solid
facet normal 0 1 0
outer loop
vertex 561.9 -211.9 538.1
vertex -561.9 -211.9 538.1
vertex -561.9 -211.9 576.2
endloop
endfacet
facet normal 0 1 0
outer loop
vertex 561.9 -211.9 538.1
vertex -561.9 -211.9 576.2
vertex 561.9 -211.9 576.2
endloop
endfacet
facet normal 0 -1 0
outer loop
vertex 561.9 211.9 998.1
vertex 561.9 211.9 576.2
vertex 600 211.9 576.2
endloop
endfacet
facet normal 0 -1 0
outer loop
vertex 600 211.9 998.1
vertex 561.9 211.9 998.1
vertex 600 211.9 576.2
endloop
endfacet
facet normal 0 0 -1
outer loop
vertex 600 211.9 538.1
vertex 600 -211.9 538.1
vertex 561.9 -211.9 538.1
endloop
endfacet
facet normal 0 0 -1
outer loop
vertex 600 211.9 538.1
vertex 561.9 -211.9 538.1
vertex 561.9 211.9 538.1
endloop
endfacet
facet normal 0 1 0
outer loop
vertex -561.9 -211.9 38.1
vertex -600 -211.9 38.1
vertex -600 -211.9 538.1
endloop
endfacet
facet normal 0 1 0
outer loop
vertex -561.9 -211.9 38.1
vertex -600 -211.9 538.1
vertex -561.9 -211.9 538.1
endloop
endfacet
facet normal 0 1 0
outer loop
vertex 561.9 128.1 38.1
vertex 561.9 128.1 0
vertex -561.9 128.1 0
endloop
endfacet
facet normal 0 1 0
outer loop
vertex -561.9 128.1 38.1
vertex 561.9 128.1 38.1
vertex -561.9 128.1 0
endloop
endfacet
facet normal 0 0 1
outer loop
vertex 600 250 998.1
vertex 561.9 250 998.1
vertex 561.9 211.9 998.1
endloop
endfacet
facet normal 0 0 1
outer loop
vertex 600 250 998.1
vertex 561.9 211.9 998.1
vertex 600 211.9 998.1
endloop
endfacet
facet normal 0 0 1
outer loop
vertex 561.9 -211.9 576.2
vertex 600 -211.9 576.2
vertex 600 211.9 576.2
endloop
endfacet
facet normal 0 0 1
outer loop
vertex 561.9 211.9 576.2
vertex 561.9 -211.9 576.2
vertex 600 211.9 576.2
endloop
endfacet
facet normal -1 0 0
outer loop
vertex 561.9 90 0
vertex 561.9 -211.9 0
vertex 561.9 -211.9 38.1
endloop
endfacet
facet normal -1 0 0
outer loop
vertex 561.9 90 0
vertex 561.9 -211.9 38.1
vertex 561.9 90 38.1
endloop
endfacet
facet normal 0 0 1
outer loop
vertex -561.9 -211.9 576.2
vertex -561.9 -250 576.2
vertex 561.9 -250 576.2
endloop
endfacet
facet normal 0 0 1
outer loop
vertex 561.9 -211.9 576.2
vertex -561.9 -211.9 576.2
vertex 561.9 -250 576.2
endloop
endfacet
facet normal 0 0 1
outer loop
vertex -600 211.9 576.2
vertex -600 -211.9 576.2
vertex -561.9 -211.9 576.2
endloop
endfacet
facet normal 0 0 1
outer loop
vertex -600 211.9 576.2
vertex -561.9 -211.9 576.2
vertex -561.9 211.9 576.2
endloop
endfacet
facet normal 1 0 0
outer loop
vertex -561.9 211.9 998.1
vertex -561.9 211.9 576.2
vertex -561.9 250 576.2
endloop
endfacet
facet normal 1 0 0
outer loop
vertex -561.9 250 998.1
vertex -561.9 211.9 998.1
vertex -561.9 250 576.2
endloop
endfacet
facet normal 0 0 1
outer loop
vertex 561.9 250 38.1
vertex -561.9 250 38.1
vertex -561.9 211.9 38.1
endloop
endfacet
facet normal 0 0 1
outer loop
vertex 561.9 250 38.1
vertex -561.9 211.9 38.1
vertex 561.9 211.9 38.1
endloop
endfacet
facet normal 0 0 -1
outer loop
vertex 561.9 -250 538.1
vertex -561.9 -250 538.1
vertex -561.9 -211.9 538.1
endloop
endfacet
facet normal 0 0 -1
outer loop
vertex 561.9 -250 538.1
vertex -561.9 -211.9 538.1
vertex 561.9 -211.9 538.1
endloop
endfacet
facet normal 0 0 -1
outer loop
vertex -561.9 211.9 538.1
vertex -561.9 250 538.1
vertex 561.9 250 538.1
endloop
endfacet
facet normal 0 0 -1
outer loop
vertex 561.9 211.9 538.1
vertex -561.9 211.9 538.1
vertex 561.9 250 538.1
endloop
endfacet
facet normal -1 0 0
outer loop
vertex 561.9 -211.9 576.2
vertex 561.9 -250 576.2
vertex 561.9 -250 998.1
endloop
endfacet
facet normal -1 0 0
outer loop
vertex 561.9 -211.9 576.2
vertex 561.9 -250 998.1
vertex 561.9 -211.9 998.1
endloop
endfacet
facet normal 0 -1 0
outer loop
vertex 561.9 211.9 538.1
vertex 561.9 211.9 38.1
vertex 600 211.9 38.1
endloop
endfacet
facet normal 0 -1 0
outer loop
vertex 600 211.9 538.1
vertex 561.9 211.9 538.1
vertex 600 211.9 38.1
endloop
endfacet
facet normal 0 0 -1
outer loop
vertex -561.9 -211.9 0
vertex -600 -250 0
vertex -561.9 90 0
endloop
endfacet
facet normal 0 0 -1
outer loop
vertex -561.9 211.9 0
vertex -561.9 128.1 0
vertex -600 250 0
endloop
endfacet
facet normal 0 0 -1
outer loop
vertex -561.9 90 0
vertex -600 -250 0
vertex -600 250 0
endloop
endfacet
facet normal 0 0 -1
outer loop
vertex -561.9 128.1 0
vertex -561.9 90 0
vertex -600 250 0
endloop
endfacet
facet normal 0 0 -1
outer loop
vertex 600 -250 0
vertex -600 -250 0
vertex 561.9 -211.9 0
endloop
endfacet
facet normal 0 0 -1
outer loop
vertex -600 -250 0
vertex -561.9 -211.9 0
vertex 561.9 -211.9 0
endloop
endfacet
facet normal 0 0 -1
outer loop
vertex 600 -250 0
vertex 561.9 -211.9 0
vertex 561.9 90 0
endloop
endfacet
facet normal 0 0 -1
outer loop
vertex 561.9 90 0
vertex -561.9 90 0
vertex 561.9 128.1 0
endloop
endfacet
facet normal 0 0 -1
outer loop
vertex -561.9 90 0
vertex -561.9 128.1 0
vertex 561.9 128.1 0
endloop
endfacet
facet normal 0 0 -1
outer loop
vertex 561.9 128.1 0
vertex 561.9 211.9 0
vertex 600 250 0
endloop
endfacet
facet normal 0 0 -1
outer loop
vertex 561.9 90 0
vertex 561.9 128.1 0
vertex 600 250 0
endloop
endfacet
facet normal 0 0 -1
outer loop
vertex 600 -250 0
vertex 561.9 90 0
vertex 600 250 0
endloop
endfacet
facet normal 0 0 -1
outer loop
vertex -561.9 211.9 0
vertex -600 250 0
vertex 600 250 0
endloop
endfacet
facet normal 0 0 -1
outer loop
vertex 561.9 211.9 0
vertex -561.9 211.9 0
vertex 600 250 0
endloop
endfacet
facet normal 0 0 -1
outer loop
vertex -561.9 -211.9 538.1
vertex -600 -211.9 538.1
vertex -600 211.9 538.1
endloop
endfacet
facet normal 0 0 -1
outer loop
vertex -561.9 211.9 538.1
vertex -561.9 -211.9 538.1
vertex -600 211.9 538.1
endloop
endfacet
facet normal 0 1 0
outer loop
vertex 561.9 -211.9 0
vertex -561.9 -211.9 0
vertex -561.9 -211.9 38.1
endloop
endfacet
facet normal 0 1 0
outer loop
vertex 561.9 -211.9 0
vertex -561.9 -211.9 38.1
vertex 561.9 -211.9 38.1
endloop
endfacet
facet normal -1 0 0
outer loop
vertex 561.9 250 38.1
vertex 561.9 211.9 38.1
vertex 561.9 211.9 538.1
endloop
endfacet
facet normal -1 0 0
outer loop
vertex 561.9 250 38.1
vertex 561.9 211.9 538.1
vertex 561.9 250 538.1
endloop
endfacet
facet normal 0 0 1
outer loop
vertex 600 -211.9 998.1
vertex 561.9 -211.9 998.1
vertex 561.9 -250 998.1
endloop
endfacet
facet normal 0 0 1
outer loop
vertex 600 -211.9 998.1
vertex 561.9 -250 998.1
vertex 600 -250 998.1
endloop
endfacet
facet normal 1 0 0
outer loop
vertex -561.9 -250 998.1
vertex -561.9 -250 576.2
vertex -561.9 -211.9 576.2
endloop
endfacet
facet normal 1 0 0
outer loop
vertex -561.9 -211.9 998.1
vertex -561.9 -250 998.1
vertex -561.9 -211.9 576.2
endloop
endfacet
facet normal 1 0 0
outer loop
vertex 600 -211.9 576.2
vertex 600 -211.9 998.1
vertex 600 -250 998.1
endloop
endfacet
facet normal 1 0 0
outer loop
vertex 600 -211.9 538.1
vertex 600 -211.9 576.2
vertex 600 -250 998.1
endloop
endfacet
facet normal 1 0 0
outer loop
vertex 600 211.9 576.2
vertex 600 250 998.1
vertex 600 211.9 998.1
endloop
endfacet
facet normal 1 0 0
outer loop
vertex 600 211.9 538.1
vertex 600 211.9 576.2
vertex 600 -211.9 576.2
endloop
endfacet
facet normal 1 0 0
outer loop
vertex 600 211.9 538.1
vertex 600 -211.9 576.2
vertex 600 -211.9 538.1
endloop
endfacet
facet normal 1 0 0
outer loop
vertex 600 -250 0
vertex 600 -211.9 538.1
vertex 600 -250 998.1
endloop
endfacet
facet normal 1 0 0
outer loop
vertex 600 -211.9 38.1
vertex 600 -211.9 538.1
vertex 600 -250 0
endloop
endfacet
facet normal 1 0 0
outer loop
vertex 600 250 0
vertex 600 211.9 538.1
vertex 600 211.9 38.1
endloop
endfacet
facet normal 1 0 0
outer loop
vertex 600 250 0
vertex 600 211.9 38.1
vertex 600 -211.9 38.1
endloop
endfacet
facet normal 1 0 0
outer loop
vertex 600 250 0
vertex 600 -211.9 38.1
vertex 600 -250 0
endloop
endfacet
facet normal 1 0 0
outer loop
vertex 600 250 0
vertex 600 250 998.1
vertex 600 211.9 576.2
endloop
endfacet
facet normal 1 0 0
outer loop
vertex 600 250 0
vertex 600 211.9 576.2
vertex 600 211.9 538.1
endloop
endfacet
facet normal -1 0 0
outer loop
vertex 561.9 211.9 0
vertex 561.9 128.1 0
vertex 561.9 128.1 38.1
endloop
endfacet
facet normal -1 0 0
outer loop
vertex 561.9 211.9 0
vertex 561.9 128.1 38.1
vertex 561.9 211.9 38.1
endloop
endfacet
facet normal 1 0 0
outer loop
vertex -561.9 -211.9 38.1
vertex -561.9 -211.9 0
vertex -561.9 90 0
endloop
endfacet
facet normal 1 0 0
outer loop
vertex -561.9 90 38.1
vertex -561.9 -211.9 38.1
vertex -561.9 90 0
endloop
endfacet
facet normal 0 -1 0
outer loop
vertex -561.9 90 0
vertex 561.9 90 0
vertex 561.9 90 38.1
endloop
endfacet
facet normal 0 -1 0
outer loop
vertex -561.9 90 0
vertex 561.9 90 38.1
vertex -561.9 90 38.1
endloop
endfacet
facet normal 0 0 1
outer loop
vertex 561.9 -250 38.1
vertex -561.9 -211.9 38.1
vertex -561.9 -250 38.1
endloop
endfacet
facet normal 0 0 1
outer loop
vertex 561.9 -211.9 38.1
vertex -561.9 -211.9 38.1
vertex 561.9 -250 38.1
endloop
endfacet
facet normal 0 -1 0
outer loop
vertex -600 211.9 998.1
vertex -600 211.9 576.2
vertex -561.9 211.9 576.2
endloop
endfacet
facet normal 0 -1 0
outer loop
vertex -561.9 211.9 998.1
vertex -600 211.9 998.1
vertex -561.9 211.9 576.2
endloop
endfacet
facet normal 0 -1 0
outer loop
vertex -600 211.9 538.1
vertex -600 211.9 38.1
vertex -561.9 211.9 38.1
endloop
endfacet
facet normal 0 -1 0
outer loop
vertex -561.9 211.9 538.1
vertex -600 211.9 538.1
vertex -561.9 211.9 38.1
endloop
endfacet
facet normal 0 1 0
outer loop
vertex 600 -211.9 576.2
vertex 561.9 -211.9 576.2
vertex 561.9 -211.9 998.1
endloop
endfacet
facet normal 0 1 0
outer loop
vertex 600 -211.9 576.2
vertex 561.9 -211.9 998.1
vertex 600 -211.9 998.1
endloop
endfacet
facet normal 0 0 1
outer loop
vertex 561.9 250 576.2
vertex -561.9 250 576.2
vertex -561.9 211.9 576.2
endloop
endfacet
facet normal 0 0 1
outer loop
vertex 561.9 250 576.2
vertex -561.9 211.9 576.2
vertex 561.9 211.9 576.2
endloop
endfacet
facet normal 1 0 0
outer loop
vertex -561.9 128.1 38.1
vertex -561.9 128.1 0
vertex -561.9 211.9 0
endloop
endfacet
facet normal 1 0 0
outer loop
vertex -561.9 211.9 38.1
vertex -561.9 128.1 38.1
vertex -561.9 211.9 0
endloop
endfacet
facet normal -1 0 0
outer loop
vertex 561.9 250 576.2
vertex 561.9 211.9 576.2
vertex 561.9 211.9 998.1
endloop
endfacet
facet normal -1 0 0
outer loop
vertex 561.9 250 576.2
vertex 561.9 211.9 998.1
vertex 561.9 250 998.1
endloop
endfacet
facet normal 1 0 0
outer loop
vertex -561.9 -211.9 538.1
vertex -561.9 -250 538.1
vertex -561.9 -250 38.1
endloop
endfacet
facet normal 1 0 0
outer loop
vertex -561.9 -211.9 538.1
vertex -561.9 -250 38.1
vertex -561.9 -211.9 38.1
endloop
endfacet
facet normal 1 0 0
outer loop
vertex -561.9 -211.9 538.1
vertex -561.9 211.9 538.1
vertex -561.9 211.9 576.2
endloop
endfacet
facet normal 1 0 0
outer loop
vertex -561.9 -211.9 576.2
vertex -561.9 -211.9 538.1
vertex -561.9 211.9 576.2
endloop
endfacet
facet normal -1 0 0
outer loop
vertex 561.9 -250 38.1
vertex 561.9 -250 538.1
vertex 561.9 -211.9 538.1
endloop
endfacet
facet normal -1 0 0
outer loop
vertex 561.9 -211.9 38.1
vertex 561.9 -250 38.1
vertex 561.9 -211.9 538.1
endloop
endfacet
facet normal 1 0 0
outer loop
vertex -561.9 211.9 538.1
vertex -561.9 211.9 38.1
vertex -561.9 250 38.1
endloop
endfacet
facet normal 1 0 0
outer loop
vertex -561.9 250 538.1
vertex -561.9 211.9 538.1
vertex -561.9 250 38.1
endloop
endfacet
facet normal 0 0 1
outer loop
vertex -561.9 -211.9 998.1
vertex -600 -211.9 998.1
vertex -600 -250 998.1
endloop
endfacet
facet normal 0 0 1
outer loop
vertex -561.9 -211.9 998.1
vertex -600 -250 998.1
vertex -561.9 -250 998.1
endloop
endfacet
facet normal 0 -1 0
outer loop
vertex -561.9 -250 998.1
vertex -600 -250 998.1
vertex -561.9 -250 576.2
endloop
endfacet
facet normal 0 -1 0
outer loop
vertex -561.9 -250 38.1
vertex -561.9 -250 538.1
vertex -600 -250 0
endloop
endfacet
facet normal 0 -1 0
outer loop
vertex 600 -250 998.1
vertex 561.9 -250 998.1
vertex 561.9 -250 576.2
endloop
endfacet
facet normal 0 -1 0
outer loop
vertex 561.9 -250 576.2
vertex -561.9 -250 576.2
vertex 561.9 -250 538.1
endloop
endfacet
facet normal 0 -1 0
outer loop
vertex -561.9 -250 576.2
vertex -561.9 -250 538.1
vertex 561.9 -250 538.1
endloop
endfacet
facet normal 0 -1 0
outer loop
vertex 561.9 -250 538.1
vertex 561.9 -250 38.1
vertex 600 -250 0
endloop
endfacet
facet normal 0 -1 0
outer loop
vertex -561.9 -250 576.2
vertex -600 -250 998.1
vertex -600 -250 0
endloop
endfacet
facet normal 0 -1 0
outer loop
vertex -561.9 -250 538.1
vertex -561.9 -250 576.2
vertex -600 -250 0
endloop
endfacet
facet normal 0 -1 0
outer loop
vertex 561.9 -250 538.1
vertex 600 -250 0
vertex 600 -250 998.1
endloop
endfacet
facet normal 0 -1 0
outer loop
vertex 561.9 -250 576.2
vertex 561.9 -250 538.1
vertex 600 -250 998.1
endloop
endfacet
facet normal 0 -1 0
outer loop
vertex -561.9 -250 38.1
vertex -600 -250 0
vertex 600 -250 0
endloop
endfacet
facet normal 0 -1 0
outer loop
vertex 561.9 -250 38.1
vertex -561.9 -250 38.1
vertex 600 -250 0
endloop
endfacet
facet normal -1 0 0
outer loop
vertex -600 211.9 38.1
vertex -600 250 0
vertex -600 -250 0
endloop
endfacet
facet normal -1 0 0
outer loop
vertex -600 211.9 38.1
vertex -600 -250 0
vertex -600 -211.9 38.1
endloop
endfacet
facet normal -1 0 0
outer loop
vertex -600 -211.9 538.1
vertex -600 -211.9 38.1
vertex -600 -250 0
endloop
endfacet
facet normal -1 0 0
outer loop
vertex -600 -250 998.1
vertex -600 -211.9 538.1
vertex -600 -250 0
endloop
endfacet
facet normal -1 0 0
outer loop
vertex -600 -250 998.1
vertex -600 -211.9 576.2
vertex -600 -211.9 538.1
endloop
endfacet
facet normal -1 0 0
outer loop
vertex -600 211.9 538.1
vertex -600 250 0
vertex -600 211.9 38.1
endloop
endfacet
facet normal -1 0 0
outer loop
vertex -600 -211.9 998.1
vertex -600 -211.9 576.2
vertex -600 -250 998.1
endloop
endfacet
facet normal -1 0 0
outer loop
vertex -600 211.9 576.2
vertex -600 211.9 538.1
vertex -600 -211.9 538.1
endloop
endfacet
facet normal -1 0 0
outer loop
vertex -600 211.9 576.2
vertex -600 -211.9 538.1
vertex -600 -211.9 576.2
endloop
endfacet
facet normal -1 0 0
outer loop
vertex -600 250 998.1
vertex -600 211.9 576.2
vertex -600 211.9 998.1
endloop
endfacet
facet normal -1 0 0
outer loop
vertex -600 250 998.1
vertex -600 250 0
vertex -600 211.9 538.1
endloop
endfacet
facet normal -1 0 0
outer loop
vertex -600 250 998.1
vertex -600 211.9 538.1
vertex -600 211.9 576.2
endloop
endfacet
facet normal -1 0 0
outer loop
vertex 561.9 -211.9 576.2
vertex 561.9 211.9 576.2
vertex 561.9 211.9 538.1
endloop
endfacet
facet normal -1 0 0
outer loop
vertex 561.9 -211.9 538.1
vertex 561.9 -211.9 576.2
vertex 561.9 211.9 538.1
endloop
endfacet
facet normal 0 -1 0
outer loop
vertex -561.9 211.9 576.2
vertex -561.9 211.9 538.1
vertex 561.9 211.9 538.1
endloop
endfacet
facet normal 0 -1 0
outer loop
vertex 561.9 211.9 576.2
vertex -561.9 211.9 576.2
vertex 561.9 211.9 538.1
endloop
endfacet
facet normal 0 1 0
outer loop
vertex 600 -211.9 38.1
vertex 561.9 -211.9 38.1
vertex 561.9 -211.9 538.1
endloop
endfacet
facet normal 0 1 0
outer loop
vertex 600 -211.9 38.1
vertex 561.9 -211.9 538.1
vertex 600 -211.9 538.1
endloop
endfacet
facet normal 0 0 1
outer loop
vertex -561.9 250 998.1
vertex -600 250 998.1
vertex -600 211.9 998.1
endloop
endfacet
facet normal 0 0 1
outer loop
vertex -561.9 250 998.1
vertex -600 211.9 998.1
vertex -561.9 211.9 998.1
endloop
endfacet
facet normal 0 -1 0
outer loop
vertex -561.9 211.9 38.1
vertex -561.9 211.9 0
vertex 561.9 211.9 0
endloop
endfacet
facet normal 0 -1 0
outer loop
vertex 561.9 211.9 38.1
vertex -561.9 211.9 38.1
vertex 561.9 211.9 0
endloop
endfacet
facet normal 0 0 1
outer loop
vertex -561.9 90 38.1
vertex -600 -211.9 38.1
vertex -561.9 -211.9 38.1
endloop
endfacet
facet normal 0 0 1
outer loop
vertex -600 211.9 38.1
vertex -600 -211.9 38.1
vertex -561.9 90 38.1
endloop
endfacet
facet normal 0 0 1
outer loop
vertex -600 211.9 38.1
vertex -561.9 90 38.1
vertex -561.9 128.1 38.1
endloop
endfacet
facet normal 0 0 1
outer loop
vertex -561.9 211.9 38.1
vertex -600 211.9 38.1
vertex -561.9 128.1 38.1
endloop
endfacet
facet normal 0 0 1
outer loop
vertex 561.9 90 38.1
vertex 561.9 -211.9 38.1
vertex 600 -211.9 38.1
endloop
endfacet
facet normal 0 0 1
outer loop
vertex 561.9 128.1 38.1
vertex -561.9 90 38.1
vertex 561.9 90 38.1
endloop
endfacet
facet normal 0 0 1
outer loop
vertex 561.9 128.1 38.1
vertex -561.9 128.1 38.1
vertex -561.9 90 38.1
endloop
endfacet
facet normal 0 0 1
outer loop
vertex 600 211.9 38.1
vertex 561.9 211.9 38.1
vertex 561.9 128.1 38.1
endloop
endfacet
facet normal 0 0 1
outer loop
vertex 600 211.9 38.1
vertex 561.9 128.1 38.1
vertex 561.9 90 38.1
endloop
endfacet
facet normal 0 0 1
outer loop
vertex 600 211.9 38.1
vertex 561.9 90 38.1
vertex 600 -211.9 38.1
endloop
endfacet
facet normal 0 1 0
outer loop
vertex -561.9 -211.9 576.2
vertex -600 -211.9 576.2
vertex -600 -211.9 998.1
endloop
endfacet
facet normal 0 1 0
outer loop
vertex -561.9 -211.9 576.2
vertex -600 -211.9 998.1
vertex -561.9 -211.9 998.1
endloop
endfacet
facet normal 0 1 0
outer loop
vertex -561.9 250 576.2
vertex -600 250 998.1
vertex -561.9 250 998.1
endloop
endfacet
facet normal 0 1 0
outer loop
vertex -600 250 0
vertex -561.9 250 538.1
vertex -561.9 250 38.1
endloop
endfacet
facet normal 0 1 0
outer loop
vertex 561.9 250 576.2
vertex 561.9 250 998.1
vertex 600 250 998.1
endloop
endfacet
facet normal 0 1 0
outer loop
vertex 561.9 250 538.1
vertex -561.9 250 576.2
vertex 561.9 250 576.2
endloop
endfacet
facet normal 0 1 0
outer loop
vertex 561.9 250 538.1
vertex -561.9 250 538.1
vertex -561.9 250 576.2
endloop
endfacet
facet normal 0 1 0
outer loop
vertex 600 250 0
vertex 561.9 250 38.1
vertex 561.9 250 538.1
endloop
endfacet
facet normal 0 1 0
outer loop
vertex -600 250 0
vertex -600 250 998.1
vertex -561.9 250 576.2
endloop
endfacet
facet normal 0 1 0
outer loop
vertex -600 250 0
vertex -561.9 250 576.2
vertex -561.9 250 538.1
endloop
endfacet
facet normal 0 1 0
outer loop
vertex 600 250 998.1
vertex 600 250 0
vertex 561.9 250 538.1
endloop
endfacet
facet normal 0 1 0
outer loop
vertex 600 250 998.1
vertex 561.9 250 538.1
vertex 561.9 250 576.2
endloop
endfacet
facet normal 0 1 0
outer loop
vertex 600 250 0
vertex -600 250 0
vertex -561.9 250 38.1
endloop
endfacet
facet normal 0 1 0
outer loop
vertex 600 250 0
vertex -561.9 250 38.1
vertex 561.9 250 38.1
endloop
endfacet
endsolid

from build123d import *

# Parameters (mm, degrees)
CROQUIS1_W              = 1200
CROQUIS1_H              = 500
CROQUIS1_W_2            = 1123.8
CROQUIS1_H_2            = 423.8
SALIENTE_EXTRUIR1_DEPTH = 38.1
CROQUIS2_W              = 38.1
CROQUIS2_H              = 38.1
SALIENTE_EXTRUIR2_DEPTH = 960
CROQUIS3_W              = 1123.8
CROQUIS3_H              = 38.1
SALIENTE_EXTRUIR4_DEPTH = 38.1
CROQUIS4_W              = 1123.8
CROQUIS4_H              = 38.1
SALIENTE_EXTRUIR5_DEPTH = 38.1
CROQUIS5_W              = 1123.8
CROQUIS5_H              = 38.1
SALIENTE_EXTRUIR6_DEPTH = 38.1
CROQUIS6_W              = 38.1
CROQUIS6_H              = 423.8
SALIENTE_EXTRUIR7_DEPTH = 38.1
CROQUIS7_W              = 38.1
CROQUIS7_H              = 423.8
SALIENTE_EXTRUIR8_DEPTH = 38.1


with BuildPart() as part:
    # Croquis1 → Saliente-Extruir1 (new body)
    with BuildSketch(Plane.XY):
        Rectangle(CROQUIS1_W, CROQUIS1_H)
        Rectangle(CROQUIS1_W_2, CROQUIS1_H_2, mode=Mode.SUBTRACT)
    extrude(amount=SALIENTE_EXTRUIR1_DEPTH)

    # Croquis2 → Saliente-Extruir2 (add)
    with BuildSketch(Plane.XY.offset(38.1)):
        with Locations((-580.95, 230.95)):
            Rectangle(CROQUIS2_W, CROQUIS2_H)
        with Locations((-580.95, -230.95)):
            Rectangle(CROQUIS2_W, CROQUIS2_H)
        with Locations((580.95, 230.95)):
            Rectangle(CROQUIS2_W, CROQUIS2_H)
        with Locations((580.95, -230.95)):
            Rectangle(CROQUIS2_W, CROQUIS2_H)
    extrude(amount=SALIENTE_EXTRUIR2_DEPTH)

    # Croquis3 → Saliente-Extruir4 (add)
    with BuildSketch(Plane(origin=(0, 0, 0), x_dir=(-1, 0, 0), z_dir=(0, 0, -1))):
        with Locations((0, 109.05)):
            Rectangle(CROQUIS3_W, CROQUIS3_H)
    extrude(amount=-SALIENTE_EXTRUIR4_DEPTH)

    # Croquis4 → Saliente-Extruir5 (add)
    with BuildSketch(Plane.XZ.offset(250)):
        with Locations((0, 557.15)):
            Rectangle(CROQUIS4_W, CROQUIS4_H)
    extrude(amount=-SALIENTE_EXTRUIR5_DEPTH)

    # Croquis5 → Saliente-Extruir6 (add)
    with BuildSketch(Plane(origin=(0, 250, 0), x_dir=(1, 0, 0), z_dir=(0, 1, 0))):
        with Locations((0, -557.15)):
            Rectangle(CROQUIS5_W, CROQUIS5_H)
    extrude(amount=-SALIENTE_EXTRUIR6_DEPTH)

    # Croquis6 → Saliente-Extruir7 (add)
    with BuildSketch(Plane.ZY.offset(600)):
        with Locations((557.15, 0)):
            Rectangle(CROQUIS6_W, CROQUIS6_H)
    extrude(amount=-SALIENTE_EXTRUIR7_DEPTH)

    # Croquis7 → Saliente-Extruir8 (add)
    with BuildSketch(Plane(origin=(600, 0, 0), x_dir=(0, 0, -1), z_dir=(1, 0, 0))):
        with Locations((-557.15, 0)):
            Rectangle(CROQUIS7_W, CROQUIS7_H)
    extrude(amount=-SALIENTE_EXTRUIR8_DEPTH)


solid = part.part
